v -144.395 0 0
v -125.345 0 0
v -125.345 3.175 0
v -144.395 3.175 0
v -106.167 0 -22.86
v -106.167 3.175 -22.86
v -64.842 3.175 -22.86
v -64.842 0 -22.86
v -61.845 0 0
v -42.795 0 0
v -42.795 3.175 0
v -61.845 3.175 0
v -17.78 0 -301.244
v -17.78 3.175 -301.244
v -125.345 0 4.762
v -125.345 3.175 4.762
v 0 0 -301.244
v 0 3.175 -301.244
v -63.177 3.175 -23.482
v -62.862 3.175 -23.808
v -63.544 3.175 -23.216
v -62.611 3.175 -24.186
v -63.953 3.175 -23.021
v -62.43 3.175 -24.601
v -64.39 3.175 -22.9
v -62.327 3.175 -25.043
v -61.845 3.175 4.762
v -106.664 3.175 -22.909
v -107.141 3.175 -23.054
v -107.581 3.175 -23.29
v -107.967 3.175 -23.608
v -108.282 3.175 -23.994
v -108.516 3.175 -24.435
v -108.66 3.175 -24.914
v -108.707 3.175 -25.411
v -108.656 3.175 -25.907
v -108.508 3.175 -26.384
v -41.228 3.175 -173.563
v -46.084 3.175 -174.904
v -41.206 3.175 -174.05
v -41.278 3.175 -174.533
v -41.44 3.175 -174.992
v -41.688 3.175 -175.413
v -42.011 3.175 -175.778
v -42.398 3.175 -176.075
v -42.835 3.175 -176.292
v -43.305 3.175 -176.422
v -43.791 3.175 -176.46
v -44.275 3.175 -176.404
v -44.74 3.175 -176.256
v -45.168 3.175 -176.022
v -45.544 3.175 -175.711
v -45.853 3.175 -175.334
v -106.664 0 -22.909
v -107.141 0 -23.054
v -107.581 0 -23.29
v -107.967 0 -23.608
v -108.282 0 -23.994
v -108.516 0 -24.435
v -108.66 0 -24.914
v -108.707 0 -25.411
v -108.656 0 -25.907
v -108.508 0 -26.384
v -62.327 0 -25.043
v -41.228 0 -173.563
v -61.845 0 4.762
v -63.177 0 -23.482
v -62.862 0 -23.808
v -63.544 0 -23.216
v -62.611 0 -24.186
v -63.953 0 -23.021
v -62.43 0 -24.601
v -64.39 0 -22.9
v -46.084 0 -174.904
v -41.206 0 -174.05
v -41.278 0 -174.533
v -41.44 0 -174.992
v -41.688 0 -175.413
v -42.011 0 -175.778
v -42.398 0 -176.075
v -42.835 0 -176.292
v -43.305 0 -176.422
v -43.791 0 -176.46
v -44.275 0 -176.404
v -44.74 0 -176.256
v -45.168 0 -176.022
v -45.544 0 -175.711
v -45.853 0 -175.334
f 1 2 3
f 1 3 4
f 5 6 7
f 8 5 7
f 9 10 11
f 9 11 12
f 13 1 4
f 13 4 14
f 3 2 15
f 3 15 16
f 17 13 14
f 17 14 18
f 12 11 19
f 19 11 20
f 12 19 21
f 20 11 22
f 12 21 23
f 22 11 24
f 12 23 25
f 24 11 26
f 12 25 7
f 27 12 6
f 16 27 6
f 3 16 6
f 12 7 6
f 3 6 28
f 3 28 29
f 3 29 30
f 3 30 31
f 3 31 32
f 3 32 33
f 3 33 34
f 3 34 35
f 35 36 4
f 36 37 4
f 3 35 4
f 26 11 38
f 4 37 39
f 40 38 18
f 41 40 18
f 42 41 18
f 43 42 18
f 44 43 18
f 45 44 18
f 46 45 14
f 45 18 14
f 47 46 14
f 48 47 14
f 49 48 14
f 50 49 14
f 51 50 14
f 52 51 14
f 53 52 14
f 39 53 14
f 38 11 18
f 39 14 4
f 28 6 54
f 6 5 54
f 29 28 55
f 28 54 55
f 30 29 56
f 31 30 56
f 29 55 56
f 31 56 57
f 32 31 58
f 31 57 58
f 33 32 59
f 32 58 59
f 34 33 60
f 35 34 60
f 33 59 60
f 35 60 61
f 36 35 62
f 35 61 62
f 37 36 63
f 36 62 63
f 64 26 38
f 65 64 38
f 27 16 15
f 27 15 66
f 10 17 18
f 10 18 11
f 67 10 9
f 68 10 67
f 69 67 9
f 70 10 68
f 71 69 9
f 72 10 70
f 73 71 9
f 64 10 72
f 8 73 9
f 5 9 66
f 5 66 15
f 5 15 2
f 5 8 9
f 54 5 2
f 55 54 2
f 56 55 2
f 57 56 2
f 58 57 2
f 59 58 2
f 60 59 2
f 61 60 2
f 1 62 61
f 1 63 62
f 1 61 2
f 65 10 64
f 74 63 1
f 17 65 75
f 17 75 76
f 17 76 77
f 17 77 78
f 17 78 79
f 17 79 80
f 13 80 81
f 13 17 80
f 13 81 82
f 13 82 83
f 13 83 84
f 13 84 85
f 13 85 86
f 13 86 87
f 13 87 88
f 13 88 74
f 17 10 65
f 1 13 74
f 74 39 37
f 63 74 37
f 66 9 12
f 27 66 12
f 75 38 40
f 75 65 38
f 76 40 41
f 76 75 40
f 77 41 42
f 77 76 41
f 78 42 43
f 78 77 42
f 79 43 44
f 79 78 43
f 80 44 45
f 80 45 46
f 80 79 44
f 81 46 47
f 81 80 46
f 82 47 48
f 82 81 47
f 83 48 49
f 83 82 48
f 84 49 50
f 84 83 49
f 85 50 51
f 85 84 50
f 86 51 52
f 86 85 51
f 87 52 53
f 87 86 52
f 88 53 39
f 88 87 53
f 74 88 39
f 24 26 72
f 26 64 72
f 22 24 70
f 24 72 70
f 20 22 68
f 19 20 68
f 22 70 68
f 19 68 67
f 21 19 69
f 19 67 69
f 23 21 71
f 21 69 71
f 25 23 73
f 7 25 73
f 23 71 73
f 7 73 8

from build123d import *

# Parameters (mm, degrees)
BOSS_EXTRUDE1_DEPTH = 3.175
CUT_EXTRUDE1_REACH  = 336.078
FILLET1_R           = 2.54
SKETCH3_W           = 63.5
SKETCH3_H           = 3.175
BOSS_EXTRUDE2_DEPTH = 4.7625


with BuildPart() as part:
    # Sketch1 → Boss-Extrude1 (new body)
    with BuildSketch(Plane(origin=(0, 0, 0), x_dir=(1, 0, 0), z_dir=(0, 1, 0))):
        Polygon((0, 301.244), (-42.794923706, 0), (-144.394923706, 0), (-17.78, 301.244), align=None)
    extrude(amount=BOSS_EXTRUDE1_DEPTH)

    # Sketch2 → Cut-Extrude1 (cut, up to next)
    with BuildSketch(Plane(origin=(0, 3.175, 0), x_dir=(1, 0, 0), z_dir=(0, 1, 0)), mode=Mode.PRIVATE) as cut_extrude1_sk1:
        Polygon((-38.460690081, 193.042545844), (-109.989583795, 22.86), (-62.636936132, 22.86), align=None)
    cut_extrude1_tool1 = extrude(cut_extrude1_sk1.sketch, amount=-CUT_EXTRUDE1_REACH, mode=Mode.PRIVATE) & part.part
    add(cut_extrude1_tool1.solids().sort_by_distance((-70.362403, 3.175, -79.587515))[0], mode=Mode.SUBTRACT)

    # Fillet1
    fillet1_edges = [part.edges().sort_by_distance(p)[0] for p in [
        (-38.460690081, 1.5875, -193.042545844),
        (-62.636936132, 1.5875, -22.86),
        (-109.989583795, 1.5875, -22.86),
    ]]
    fillet(fillet1_edges, radius=FILLET1_R)

    # Sketch3 → Boss-Extrude2 (add)
    with BuildSketch(Plane.XY):
        with Locations((-93.594923706, 1.5875)):
            Rectangle(SKETCH3_W, SKETCH3_H)
    extrude(amount=BOSS_EXTRUDE2_DEPTH)


solid = part.part
